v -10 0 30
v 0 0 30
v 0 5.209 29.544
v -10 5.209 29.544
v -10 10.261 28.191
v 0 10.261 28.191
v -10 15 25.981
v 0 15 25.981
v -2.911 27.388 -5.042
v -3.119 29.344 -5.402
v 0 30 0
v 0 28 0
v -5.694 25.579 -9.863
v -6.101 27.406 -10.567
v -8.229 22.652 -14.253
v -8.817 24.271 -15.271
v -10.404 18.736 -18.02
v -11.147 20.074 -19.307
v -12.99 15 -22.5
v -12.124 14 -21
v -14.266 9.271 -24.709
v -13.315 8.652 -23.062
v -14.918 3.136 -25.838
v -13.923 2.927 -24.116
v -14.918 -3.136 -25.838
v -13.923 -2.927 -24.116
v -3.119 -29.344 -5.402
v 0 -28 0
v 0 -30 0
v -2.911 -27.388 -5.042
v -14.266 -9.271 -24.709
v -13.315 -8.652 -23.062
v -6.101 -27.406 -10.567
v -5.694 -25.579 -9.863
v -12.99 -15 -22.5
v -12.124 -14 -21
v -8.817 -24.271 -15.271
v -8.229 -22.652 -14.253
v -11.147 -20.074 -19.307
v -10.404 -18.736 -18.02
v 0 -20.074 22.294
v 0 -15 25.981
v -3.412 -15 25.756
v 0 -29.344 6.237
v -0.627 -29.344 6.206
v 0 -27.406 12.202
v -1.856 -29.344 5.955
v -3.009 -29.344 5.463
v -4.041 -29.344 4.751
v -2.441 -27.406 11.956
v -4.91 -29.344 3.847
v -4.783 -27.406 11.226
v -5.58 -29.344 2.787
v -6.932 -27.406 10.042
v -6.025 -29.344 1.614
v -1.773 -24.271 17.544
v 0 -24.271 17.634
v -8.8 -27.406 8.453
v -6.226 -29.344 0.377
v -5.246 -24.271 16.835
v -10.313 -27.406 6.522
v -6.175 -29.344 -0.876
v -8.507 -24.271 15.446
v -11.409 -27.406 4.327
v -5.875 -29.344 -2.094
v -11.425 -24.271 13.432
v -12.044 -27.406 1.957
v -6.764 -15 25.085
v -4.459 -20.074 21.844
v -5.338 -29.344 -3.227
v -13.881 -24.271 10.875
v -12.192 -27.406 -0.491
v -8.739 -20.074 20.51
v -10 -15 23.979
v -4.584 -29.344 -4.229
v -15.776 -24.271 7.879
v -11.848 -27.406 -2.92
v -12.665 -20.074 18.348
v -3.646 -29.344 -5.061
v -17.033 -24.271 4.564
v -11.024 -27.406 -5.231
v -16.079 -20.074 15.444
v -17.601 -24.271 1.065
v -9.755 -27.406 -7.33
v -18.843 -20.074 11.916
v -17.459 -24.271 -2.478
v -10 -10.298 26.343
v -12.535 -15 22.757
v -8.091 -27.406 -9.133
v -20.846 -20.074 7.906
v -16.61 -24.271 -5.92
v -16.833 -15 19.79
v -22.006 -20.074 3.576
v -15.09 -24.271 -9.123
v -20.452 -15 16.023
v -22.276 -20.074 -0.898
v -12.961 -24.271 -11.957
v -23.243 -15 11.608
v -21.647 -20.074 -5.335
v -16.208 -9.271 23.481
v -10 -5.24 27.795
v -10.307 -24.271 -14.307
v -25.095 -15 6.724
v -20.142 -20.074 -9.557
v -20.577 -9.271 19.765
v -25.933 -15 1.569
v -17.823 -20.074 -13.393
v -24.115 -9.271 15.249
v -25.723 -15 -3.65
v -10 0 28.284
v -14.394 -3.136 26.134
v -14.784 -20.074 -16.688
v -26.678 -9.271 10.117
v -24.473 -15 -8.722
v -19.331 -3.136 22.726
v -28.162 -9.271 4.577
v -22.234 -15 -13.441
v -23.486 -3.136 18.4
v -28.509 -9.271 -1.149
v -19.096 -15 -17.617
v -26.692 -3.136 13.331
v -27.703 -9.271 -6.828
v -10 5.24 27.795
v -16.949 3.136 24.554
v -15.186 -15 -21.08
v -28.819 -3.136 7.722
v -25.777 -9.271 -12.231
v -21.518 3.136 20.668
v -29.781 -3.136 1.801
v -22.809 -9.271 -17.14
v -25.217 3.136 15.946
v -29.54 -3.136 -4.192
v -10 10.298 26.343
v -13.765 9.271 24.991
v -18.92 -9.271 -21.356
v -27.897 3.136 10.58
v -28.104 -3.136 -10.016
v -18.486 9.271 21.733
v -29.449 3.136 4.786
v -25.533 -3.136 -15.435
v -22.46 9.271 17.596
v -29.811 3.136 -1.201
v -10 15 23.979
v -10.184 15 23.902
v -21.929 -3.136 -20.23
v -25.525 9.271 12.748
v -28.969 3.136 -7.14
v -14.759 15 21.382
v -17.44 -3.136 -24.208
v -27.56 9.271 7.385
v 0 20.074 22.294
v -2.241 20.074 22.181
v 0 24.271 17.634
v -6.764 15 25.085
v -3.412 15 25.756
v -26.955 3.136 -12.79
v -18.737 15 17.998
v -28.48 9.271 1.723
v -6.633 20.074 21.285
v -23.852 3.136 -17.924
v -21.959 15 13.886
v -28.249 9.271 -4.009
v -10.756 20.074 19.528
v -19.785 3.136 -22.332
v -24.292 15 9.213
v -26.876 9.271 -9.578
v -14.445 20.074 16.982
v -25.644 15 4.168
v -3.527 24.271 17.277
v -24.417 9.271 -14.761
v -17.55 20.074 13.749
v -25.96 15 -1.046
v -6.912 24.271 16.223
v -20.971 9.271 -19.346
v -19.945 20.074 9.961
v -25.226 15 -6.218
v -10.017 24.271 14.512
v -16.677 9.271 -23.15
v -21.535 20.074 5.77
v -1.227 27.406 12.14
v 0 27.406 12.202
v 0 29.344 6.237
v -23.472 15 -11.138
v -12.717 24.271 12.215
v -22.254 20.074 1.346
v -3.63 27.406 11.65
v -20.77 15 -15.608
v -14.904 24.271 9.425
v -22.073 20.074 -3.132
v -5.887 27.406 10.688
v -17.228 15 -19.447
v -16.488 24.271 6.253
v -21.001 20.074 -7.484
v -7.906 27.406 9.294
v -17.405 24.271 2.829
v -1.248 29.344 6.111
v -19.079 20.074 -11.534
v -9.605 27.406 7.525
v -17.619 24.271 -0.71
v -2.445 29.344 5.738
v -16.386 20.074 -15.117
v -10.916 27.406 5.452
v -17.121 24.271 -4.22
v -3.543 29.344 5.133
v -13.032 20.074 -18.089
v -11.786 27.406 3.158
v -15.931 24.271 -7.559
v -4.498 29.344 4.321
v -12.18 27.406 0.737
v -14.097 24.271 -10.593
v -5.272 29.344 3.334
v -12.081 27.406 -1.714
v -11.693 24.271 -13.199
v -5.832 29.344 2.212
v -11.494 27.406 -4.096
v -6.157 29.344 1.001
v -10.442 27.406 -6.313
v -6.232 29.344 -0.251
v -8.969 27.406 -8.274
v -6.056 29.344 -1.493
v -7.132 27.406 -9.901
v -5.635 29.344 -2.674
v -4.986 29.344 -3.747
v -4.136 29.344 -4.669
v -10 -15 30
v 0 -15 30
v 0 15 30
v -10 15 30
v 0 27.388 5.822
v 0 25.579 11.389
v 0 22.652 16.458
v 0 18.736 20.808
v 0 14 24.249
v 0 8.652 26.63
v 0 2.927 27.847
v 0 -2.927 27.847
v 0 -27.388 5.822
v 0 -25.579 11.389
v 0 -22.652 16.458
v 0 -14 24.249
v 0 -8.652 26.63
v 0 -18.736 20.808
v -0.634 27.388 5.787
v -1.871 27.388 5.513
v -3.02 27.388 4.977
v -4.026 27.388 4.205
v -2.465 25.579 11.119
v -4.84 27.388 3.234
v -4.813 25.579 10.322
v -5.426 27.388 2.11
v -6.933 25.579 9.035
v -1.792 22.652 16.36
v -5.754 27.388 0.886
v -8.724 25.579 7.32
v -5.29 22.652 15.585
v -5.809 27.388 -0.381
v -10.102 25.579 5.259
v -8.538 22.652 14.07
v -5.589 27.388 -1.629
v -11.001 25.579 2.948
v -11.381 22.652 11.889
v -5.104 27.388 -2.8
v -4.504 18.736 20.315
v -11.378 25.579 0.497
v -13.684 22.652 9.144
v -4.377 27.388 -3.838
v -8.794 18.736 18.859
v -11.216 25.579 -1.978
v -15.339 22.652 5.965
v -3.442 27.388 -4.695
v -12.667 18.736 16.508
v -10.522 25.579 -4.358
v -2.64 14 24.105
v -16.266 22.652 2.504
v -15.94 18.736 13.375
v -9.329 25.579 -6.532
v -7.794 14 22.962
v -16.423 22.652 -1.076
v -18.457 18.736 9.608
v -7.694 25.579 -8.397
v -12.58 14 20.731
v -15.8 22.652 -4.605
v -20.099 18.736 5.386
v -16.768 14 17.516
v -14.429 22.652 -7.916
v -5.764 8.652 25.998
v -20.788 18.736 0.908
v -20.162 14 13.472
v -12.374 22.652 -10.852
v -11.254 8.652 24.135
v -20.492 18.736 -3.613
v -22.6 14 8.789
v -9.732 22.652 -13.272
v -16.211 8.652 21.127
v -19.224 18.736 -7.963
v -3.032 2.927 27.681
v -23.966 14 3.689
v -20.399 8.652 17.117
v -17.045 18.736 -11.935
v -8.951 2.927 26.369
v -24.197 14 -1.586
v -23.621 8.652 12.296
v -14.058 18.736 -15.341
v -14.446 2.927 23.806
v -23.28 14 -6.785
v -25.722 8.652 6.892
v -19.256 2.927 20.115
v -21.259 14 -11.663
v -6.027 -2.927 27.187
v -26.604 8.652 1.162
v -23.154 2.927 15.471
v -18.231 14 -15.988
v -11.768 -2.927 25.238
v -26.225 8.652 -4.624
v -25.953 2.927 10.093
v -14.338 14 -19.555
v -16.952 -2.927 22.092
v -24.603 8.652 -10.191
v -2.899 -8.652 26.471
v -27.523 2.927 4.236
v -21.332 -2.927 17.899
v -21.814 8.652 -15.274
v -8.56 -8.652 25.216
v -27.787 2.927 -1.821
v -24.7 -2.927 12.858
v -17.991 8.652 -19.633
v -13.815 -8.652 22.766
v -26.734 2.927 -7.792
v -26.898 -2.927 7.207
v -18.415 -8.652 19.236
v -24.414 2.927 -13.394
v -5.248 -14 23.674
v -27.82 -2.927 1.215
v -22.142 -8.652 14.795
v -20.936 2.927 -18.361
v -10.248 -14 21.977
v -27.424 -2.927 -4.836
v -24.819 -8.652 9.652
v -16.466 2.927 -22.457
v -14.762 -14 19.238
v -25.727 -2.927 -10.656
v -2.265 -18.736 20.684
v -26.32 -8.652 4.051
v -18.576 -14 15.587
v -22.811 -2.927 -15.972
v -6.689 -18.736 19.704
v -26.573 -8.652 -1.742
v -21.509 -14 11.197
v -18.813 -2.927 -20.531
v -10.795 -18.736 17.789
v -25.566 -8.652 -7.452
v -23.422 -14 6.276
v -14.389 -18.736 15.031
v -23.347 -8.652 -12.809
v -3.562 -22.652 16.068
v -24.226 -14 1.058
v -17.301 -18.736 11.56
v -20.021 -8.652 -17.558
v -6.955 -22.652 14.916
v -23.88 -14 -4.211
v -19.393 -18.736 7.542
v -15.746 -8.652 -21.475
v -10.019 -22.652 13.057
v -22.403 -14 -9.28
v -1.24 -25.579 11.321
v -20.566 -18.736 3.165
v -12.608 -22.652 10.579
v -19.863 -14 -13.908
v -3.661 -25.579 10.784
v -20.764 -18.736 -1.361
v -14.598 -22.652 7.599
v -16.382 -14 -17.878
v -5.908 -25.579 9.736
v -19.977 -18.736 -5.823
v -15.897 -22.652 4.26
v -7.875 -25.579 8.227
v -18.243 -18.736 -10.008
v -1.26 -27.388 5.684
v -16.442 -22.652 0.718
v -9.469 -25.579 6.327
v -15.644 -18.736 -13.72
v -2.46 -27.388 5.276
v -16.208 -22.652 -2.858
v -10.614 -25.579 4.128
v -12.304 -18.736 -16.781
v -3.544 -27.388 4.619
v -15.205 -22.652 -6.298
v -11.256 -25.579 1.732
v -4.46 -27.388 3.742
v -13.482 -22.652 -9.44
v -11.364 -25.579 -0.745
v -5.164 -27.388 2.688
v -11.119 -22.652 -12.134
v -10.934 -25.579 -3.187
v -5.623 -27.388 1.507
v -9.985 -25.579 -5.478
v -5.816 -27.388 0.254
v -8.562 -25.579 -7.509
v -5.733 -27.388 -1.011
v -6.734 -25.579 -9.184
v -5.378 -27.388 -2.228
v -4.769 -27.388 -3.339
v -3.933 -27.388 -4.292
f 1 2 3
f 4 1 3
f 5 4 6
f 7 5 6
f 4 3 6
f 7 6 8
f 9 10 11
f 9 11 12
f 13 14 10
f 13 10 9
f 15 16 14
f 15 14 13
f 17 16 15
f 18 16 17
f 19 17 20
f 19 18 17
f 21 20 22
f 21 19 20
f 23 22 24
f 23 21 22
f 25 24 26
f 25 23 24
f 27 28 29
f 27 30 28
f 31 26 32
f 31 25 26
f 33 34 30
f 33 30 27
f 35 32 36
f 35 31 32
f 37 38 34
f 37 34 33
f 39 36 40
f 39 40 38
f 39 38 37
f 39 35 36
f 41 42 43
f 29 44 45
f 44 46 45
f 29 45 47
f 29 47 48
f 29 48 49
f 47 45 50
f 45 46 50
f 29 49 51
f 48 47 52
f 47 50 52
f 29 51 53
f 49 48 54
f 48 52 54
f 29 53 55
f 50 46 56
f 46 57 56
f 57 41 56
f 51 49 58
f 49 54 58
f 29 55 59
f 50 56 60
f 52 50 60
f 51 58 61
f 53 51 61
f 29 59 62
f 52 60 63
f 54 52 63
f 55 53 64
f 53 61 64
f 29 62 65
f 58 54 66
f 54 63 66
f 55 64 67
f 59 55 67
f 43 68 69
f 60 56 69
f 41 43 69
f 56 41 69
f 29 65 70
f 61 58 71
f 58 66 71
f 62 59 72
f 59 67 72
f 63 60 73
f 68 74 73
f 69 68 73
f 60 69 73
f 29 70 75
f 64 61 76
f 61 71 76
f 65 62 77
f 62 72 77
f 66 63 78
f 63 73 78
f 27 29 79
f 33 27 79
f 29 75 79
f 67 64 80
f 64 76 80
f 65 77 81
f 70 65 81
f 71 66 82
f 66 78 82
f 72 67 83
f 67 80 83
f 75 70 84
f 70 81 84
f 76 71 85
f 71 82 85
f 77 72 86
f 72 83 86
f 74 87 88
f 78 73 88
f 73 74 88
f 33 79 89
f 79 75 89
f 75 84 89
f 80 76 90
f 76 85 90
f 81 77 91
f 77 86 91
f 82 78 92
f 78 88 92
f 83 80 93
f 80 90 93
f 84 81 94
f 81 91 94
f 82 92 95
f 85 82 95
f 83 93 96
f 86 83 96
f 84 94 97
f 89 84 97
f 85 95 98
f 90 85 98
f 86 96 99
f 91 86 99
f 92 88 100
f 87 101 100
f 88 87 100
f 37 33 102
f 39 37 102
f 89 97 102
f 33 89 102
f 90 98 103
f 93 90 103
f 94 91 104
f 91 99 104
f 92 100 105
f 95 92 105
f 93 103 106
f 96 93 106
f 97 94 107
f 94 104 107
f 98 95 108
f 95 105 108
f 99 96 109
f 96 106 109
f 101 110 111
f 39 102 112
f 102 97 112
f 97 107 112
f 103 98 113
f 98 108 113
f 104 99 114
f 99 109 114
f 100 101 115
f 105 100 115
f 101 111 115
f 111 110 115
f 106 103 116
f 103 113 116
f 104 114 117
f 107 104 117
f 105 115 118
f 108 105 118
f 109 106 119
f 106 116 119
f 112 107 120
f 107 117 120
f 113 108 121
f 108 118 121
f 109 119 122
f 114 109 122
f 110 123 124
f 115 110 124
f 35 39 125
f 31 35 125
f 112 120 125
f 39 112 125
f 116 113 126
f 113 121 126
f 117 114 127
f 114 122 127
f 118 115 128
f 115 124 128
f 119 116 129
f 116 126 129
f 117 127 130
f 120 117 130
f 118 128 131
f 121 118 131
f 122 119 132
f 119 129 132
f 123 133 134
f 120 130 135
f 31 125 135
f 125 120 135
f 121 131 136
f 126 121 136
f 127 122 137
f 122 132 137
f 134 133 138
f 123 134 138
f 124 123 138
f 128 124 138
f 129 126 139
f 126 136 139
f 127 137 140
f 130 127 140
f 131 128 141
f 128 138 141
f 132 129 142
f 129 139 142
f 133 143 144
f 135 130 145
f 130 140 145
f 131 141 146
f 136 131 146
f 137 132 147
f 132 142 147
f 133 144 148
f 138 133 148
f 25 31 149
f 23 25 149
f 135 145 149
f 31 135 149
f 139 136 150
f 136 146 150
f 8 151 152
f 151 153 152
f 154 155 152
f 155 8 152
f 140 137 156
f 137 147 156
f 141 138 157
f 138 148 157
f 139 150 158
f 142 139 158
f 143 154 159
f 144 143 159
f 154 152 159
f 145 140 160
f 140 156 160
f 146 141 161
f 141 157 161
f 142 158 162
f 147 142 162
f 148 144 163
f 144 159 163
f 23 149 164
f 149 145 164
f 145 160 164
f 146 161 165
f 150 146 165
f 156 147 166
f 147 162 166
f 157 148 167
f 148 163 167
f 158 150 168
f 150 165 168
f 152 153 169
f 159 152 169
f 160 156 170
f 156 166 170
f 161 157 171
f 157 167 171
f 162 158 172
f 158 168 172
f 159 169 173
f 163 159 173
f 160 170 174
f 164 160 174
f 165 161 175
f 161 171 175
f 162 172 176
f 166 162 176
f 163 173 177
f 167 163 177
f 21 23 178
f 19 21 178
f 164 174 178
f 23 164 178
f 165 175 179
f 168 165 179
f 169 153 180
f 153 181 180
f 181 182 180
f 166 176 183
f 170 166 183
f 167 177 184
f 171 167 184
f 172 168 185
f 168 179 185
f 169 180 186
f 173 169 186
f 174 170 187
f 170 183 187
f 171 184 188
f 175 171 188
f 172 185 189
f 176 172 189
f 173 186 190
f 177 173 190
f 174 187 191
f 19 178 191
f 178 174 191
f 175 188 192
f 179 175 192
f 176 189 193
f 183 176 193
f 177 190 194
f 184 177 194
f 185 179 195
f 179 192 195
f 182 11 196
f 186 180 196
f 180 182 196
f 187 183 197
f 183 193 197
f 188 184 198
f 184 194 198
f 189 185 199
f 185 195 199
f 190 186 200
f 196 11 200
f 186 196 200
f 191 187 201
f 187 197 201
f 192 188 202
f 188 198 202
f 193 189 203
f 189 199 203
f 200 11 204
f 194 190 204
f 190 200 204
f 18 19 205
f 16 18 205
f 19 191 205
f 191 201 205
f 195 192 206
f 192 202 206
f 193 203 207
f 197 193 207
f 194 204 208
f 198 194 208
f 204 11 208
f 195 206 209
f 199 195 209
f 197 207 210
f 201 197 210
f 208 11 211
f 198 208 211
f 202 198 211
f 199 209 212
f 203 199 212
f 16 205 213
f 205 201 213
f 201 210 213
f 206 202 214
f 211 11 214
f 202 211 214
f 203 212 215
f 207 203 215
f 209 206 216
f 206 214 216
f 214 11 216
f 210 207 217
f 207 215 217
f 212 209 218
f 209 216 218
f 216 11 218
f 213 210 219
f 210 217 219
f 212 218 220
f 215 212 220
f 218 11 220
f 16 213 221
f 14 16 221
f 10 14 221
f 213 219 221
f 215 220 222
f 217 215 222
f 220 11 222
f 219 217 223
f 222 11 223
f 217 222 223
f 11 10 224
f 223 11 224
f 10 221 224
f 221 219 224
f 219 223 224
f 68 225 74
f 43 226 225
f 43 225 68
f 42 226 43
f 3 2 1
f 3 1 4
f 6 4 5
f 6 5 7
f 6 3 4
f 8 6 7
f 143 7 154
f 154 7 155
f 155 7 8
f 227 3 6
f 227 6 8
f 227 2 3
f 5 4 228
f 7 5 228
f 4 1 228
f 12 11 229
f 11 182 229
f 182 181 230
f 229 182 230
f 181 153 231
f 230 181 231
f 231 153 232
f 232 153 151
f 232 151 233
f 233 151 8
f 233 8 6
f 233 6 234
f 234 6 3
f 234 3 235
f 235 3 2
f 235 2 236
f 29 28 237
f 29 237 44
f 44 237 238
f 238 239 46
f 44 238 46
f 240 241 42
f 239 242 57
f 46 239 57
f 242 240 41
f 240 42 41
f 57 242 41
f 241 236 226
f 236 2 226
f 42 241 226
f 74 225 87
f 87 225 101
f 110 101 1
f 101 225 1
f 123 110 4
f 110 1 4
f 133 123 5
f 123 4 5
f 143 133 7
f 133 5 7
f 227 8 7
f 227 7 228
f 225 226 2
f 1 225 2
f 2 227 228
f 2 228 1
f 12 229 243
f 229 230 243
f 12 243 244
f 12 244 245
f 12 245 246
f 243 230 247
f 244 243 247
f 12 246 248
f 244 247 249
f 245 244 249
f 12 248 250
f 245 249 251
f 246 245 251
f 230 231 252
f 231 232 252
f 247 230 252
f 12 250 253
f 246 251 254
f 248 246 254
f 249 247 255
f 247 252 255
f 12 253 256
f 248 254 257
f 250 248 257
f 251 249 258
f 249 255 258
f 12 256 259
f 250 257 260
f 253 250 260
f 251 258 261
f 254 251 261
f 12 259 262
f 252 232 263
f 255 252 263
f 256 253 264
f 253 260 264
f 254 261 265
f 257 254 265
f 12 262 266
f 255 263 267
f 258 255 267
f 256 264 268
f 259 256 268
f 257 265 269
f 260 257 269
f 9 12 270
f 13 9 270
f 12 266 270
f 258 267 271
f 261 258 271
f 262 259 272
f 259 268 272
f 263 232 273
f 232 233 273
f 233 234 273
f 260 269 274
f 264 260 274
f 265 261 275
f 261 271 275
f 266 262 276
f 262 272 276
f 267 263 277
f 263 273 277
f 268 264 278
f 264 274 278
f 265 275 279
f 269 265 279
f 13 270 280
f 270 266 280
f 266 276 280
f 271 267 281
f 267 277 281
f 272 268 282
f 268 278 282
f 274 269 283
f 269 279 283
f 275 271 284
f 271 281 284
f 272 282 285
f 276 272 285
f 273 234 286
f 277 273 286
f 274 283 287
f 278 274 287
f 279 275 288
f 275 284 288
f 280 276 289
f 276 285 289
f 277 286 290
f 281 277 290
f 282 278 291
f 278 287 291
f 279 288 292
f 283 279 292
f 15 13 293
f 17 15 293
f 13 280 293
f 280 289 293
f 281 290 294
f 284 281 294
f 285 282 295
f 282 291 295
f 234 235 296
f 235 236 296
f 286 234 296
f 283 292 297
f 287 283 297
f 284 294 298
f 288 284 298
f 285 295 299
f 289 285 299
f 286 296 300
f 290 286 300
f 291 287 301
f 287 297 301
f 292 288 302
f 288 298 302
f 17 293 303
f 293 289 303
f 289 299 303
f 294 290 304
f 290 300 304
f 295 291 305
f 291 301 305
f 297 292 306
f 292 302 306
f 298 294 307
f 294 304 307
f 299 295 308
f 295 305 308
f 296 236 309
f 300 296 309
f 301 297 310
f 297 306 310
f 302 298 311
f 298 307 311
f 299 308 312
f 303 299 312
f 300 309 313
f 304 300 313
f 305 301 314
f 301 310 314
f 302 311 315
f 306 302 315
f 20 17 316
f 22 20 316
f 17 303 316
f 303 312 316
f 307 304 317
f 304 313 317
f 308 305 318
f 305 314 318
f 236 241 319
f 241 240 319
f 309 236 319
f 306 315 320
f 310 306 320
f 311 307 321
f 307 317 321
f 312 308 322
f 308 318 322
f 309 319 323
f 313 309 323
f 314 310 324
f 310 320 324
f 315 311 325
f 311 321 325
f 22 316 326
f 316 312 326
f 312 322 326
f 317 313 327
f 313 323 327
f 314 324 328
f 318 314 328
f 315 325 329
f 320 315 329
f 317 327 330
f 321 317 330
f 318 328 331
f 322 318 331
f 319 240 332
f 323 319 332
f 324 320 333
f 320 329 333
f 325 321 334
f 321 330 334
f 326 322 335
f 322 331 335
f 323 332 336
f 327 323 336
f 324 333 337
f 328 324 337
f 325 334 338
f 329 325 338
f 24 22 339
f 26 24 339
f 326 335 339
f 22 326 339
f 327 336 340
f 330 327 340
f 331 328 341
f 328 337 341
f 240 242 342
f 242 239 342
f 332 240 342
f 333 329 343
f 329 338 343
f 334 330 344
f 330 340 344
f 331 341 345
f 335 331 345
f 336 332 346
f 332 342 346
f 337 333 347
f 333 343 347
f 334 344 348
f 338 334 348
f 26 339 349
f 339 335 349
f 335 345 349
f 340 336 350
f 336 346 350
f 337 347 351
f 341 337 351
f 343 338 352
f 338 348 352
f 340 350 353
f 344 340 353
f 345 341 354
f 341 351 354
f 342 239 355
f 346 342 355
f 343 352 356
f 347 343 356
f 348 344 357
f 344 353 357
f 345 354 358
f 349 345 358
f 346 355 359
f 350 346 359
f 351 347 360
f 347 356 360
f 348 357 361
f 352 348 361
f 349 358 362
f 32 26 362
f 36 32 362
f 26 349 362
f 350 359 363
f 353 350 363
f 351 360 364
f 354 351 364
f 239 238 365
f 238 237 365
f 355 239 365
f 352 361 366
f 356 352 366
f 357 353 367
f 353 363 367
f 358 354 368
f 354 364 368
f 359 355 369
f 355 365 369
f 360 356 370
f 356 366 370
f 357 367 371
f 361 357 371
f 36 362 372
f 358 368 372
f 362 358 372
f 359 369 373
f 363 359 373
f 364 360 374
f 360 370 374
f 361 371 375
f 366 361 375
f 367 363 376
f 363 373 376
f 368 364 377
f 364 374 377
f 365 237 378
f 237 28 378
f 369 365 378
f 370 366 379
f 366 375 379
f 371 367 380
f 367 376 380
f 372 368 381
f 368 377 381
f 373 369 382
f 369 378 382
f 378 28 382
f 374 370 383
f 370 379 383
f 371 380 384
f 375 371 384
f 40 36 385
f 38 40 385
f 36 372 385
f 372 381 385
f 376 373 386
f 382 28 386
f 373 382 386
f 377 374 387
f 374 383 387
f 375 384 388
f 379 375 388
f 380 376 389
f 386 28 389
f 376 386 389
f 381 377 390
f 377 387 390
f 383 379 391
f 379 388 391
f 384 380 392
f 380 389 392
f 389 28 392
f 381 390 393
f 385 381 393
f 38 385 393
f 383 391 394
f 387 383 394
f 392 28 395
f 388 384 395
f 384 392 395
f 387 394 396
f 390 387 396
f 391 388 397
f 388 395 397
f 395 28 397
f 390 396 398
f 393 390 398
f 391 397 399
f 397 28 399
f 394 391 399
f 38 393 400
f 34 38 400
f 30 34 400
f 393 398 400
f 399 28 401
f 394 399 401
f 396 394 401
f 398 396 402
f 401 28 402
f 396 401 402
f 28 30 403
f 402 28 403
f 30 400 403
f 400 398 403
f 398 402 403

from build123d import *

# Parameters (mm, degrees)
REVOLVE1_ANGLE      = 150
BOSS_EXTRUDE1_DEPTH = 10
BOSS_EXTRUDE2_START = -10
BOSS_EXTRUDE2_DEPTH = 10


with BuildPart() as part:
    # Sketch1 → Revolve1 (revolve)
    with BuildSketch(Plane.YZ):
        with BuildLine():
            Line((-28, 0), (-30, 0))
            ThreePointArc((-30, 0), (0, 30), (30, 0))
            Line((30, 0), (28, 0))
            ThreePointArc((28, 0), (0, 28), (-28, 0))
        make_face()
    revolve(axis=Axis((0, -28, 0), (0, -1, 0)), revolution_arc=REVOLVE1_ANGLE)

    # Boss-Extrude2: read off the stored shape, not the designer's step
    # Boss-Extrude2 outline → Boss-Extrude2 (add)
    with BuildSketch(Plane(origin=(-10, 0, 0), x_dir=(0, -1, 0), z_dir=(-1, 0, 0)).offset(BOSS_EXTRUDE2_START)):
        with BuildLine():
            Line((-15, 25.980762114), (-15, 23.979157617))
            ThreePointArc((-15, 23.979157617), (-7.802788017, 27.186697099), (0, 28.284271247))
            Line((0, 28.284271247), (0, 30))
            ThreePointArc((0, 30), (-7.764571353, 28.977774789), (-15, 25.980762114))
        make_face()
    boss_extrude2 = extrude(amount=BOSS_EXTRUDE2_DEPTH)


with BuildPart() as body_2:
    # Sketch2 → Boss-Extrude1 (new body)
    with BuildSketch(Plane.YZ):
        with BuildLine():
            Line((15, 30), (0, 30))
            ThreePointArc((0, 30), (7.764571353, 28.977774789), (15, 25.980762114))
            Line((15, 25.980762114), (15, 30))
        make_face()
    boss_extrude1 = extrude(amount=-BOSS_EXTRUDE1_DEPTH)


with BuildPart() as part_1:
    add(part.part)

    # Mirror1: Boss-Extrude1, Boss-Extrude2 across plane
    add(boss_extrude1.mirror(Plane(origin=(30.001, 0, 0), x_dir=(0, 0, 1), z_dir=(0, 1, 0))))
    add(boss_extrude2.mirror(Plane(origin=(30.001, 0, 0), x_dir=(0, 0, 1), z_dir=(0, 1, 0))))


solid = Compound([body_2.part, part_1.part])
